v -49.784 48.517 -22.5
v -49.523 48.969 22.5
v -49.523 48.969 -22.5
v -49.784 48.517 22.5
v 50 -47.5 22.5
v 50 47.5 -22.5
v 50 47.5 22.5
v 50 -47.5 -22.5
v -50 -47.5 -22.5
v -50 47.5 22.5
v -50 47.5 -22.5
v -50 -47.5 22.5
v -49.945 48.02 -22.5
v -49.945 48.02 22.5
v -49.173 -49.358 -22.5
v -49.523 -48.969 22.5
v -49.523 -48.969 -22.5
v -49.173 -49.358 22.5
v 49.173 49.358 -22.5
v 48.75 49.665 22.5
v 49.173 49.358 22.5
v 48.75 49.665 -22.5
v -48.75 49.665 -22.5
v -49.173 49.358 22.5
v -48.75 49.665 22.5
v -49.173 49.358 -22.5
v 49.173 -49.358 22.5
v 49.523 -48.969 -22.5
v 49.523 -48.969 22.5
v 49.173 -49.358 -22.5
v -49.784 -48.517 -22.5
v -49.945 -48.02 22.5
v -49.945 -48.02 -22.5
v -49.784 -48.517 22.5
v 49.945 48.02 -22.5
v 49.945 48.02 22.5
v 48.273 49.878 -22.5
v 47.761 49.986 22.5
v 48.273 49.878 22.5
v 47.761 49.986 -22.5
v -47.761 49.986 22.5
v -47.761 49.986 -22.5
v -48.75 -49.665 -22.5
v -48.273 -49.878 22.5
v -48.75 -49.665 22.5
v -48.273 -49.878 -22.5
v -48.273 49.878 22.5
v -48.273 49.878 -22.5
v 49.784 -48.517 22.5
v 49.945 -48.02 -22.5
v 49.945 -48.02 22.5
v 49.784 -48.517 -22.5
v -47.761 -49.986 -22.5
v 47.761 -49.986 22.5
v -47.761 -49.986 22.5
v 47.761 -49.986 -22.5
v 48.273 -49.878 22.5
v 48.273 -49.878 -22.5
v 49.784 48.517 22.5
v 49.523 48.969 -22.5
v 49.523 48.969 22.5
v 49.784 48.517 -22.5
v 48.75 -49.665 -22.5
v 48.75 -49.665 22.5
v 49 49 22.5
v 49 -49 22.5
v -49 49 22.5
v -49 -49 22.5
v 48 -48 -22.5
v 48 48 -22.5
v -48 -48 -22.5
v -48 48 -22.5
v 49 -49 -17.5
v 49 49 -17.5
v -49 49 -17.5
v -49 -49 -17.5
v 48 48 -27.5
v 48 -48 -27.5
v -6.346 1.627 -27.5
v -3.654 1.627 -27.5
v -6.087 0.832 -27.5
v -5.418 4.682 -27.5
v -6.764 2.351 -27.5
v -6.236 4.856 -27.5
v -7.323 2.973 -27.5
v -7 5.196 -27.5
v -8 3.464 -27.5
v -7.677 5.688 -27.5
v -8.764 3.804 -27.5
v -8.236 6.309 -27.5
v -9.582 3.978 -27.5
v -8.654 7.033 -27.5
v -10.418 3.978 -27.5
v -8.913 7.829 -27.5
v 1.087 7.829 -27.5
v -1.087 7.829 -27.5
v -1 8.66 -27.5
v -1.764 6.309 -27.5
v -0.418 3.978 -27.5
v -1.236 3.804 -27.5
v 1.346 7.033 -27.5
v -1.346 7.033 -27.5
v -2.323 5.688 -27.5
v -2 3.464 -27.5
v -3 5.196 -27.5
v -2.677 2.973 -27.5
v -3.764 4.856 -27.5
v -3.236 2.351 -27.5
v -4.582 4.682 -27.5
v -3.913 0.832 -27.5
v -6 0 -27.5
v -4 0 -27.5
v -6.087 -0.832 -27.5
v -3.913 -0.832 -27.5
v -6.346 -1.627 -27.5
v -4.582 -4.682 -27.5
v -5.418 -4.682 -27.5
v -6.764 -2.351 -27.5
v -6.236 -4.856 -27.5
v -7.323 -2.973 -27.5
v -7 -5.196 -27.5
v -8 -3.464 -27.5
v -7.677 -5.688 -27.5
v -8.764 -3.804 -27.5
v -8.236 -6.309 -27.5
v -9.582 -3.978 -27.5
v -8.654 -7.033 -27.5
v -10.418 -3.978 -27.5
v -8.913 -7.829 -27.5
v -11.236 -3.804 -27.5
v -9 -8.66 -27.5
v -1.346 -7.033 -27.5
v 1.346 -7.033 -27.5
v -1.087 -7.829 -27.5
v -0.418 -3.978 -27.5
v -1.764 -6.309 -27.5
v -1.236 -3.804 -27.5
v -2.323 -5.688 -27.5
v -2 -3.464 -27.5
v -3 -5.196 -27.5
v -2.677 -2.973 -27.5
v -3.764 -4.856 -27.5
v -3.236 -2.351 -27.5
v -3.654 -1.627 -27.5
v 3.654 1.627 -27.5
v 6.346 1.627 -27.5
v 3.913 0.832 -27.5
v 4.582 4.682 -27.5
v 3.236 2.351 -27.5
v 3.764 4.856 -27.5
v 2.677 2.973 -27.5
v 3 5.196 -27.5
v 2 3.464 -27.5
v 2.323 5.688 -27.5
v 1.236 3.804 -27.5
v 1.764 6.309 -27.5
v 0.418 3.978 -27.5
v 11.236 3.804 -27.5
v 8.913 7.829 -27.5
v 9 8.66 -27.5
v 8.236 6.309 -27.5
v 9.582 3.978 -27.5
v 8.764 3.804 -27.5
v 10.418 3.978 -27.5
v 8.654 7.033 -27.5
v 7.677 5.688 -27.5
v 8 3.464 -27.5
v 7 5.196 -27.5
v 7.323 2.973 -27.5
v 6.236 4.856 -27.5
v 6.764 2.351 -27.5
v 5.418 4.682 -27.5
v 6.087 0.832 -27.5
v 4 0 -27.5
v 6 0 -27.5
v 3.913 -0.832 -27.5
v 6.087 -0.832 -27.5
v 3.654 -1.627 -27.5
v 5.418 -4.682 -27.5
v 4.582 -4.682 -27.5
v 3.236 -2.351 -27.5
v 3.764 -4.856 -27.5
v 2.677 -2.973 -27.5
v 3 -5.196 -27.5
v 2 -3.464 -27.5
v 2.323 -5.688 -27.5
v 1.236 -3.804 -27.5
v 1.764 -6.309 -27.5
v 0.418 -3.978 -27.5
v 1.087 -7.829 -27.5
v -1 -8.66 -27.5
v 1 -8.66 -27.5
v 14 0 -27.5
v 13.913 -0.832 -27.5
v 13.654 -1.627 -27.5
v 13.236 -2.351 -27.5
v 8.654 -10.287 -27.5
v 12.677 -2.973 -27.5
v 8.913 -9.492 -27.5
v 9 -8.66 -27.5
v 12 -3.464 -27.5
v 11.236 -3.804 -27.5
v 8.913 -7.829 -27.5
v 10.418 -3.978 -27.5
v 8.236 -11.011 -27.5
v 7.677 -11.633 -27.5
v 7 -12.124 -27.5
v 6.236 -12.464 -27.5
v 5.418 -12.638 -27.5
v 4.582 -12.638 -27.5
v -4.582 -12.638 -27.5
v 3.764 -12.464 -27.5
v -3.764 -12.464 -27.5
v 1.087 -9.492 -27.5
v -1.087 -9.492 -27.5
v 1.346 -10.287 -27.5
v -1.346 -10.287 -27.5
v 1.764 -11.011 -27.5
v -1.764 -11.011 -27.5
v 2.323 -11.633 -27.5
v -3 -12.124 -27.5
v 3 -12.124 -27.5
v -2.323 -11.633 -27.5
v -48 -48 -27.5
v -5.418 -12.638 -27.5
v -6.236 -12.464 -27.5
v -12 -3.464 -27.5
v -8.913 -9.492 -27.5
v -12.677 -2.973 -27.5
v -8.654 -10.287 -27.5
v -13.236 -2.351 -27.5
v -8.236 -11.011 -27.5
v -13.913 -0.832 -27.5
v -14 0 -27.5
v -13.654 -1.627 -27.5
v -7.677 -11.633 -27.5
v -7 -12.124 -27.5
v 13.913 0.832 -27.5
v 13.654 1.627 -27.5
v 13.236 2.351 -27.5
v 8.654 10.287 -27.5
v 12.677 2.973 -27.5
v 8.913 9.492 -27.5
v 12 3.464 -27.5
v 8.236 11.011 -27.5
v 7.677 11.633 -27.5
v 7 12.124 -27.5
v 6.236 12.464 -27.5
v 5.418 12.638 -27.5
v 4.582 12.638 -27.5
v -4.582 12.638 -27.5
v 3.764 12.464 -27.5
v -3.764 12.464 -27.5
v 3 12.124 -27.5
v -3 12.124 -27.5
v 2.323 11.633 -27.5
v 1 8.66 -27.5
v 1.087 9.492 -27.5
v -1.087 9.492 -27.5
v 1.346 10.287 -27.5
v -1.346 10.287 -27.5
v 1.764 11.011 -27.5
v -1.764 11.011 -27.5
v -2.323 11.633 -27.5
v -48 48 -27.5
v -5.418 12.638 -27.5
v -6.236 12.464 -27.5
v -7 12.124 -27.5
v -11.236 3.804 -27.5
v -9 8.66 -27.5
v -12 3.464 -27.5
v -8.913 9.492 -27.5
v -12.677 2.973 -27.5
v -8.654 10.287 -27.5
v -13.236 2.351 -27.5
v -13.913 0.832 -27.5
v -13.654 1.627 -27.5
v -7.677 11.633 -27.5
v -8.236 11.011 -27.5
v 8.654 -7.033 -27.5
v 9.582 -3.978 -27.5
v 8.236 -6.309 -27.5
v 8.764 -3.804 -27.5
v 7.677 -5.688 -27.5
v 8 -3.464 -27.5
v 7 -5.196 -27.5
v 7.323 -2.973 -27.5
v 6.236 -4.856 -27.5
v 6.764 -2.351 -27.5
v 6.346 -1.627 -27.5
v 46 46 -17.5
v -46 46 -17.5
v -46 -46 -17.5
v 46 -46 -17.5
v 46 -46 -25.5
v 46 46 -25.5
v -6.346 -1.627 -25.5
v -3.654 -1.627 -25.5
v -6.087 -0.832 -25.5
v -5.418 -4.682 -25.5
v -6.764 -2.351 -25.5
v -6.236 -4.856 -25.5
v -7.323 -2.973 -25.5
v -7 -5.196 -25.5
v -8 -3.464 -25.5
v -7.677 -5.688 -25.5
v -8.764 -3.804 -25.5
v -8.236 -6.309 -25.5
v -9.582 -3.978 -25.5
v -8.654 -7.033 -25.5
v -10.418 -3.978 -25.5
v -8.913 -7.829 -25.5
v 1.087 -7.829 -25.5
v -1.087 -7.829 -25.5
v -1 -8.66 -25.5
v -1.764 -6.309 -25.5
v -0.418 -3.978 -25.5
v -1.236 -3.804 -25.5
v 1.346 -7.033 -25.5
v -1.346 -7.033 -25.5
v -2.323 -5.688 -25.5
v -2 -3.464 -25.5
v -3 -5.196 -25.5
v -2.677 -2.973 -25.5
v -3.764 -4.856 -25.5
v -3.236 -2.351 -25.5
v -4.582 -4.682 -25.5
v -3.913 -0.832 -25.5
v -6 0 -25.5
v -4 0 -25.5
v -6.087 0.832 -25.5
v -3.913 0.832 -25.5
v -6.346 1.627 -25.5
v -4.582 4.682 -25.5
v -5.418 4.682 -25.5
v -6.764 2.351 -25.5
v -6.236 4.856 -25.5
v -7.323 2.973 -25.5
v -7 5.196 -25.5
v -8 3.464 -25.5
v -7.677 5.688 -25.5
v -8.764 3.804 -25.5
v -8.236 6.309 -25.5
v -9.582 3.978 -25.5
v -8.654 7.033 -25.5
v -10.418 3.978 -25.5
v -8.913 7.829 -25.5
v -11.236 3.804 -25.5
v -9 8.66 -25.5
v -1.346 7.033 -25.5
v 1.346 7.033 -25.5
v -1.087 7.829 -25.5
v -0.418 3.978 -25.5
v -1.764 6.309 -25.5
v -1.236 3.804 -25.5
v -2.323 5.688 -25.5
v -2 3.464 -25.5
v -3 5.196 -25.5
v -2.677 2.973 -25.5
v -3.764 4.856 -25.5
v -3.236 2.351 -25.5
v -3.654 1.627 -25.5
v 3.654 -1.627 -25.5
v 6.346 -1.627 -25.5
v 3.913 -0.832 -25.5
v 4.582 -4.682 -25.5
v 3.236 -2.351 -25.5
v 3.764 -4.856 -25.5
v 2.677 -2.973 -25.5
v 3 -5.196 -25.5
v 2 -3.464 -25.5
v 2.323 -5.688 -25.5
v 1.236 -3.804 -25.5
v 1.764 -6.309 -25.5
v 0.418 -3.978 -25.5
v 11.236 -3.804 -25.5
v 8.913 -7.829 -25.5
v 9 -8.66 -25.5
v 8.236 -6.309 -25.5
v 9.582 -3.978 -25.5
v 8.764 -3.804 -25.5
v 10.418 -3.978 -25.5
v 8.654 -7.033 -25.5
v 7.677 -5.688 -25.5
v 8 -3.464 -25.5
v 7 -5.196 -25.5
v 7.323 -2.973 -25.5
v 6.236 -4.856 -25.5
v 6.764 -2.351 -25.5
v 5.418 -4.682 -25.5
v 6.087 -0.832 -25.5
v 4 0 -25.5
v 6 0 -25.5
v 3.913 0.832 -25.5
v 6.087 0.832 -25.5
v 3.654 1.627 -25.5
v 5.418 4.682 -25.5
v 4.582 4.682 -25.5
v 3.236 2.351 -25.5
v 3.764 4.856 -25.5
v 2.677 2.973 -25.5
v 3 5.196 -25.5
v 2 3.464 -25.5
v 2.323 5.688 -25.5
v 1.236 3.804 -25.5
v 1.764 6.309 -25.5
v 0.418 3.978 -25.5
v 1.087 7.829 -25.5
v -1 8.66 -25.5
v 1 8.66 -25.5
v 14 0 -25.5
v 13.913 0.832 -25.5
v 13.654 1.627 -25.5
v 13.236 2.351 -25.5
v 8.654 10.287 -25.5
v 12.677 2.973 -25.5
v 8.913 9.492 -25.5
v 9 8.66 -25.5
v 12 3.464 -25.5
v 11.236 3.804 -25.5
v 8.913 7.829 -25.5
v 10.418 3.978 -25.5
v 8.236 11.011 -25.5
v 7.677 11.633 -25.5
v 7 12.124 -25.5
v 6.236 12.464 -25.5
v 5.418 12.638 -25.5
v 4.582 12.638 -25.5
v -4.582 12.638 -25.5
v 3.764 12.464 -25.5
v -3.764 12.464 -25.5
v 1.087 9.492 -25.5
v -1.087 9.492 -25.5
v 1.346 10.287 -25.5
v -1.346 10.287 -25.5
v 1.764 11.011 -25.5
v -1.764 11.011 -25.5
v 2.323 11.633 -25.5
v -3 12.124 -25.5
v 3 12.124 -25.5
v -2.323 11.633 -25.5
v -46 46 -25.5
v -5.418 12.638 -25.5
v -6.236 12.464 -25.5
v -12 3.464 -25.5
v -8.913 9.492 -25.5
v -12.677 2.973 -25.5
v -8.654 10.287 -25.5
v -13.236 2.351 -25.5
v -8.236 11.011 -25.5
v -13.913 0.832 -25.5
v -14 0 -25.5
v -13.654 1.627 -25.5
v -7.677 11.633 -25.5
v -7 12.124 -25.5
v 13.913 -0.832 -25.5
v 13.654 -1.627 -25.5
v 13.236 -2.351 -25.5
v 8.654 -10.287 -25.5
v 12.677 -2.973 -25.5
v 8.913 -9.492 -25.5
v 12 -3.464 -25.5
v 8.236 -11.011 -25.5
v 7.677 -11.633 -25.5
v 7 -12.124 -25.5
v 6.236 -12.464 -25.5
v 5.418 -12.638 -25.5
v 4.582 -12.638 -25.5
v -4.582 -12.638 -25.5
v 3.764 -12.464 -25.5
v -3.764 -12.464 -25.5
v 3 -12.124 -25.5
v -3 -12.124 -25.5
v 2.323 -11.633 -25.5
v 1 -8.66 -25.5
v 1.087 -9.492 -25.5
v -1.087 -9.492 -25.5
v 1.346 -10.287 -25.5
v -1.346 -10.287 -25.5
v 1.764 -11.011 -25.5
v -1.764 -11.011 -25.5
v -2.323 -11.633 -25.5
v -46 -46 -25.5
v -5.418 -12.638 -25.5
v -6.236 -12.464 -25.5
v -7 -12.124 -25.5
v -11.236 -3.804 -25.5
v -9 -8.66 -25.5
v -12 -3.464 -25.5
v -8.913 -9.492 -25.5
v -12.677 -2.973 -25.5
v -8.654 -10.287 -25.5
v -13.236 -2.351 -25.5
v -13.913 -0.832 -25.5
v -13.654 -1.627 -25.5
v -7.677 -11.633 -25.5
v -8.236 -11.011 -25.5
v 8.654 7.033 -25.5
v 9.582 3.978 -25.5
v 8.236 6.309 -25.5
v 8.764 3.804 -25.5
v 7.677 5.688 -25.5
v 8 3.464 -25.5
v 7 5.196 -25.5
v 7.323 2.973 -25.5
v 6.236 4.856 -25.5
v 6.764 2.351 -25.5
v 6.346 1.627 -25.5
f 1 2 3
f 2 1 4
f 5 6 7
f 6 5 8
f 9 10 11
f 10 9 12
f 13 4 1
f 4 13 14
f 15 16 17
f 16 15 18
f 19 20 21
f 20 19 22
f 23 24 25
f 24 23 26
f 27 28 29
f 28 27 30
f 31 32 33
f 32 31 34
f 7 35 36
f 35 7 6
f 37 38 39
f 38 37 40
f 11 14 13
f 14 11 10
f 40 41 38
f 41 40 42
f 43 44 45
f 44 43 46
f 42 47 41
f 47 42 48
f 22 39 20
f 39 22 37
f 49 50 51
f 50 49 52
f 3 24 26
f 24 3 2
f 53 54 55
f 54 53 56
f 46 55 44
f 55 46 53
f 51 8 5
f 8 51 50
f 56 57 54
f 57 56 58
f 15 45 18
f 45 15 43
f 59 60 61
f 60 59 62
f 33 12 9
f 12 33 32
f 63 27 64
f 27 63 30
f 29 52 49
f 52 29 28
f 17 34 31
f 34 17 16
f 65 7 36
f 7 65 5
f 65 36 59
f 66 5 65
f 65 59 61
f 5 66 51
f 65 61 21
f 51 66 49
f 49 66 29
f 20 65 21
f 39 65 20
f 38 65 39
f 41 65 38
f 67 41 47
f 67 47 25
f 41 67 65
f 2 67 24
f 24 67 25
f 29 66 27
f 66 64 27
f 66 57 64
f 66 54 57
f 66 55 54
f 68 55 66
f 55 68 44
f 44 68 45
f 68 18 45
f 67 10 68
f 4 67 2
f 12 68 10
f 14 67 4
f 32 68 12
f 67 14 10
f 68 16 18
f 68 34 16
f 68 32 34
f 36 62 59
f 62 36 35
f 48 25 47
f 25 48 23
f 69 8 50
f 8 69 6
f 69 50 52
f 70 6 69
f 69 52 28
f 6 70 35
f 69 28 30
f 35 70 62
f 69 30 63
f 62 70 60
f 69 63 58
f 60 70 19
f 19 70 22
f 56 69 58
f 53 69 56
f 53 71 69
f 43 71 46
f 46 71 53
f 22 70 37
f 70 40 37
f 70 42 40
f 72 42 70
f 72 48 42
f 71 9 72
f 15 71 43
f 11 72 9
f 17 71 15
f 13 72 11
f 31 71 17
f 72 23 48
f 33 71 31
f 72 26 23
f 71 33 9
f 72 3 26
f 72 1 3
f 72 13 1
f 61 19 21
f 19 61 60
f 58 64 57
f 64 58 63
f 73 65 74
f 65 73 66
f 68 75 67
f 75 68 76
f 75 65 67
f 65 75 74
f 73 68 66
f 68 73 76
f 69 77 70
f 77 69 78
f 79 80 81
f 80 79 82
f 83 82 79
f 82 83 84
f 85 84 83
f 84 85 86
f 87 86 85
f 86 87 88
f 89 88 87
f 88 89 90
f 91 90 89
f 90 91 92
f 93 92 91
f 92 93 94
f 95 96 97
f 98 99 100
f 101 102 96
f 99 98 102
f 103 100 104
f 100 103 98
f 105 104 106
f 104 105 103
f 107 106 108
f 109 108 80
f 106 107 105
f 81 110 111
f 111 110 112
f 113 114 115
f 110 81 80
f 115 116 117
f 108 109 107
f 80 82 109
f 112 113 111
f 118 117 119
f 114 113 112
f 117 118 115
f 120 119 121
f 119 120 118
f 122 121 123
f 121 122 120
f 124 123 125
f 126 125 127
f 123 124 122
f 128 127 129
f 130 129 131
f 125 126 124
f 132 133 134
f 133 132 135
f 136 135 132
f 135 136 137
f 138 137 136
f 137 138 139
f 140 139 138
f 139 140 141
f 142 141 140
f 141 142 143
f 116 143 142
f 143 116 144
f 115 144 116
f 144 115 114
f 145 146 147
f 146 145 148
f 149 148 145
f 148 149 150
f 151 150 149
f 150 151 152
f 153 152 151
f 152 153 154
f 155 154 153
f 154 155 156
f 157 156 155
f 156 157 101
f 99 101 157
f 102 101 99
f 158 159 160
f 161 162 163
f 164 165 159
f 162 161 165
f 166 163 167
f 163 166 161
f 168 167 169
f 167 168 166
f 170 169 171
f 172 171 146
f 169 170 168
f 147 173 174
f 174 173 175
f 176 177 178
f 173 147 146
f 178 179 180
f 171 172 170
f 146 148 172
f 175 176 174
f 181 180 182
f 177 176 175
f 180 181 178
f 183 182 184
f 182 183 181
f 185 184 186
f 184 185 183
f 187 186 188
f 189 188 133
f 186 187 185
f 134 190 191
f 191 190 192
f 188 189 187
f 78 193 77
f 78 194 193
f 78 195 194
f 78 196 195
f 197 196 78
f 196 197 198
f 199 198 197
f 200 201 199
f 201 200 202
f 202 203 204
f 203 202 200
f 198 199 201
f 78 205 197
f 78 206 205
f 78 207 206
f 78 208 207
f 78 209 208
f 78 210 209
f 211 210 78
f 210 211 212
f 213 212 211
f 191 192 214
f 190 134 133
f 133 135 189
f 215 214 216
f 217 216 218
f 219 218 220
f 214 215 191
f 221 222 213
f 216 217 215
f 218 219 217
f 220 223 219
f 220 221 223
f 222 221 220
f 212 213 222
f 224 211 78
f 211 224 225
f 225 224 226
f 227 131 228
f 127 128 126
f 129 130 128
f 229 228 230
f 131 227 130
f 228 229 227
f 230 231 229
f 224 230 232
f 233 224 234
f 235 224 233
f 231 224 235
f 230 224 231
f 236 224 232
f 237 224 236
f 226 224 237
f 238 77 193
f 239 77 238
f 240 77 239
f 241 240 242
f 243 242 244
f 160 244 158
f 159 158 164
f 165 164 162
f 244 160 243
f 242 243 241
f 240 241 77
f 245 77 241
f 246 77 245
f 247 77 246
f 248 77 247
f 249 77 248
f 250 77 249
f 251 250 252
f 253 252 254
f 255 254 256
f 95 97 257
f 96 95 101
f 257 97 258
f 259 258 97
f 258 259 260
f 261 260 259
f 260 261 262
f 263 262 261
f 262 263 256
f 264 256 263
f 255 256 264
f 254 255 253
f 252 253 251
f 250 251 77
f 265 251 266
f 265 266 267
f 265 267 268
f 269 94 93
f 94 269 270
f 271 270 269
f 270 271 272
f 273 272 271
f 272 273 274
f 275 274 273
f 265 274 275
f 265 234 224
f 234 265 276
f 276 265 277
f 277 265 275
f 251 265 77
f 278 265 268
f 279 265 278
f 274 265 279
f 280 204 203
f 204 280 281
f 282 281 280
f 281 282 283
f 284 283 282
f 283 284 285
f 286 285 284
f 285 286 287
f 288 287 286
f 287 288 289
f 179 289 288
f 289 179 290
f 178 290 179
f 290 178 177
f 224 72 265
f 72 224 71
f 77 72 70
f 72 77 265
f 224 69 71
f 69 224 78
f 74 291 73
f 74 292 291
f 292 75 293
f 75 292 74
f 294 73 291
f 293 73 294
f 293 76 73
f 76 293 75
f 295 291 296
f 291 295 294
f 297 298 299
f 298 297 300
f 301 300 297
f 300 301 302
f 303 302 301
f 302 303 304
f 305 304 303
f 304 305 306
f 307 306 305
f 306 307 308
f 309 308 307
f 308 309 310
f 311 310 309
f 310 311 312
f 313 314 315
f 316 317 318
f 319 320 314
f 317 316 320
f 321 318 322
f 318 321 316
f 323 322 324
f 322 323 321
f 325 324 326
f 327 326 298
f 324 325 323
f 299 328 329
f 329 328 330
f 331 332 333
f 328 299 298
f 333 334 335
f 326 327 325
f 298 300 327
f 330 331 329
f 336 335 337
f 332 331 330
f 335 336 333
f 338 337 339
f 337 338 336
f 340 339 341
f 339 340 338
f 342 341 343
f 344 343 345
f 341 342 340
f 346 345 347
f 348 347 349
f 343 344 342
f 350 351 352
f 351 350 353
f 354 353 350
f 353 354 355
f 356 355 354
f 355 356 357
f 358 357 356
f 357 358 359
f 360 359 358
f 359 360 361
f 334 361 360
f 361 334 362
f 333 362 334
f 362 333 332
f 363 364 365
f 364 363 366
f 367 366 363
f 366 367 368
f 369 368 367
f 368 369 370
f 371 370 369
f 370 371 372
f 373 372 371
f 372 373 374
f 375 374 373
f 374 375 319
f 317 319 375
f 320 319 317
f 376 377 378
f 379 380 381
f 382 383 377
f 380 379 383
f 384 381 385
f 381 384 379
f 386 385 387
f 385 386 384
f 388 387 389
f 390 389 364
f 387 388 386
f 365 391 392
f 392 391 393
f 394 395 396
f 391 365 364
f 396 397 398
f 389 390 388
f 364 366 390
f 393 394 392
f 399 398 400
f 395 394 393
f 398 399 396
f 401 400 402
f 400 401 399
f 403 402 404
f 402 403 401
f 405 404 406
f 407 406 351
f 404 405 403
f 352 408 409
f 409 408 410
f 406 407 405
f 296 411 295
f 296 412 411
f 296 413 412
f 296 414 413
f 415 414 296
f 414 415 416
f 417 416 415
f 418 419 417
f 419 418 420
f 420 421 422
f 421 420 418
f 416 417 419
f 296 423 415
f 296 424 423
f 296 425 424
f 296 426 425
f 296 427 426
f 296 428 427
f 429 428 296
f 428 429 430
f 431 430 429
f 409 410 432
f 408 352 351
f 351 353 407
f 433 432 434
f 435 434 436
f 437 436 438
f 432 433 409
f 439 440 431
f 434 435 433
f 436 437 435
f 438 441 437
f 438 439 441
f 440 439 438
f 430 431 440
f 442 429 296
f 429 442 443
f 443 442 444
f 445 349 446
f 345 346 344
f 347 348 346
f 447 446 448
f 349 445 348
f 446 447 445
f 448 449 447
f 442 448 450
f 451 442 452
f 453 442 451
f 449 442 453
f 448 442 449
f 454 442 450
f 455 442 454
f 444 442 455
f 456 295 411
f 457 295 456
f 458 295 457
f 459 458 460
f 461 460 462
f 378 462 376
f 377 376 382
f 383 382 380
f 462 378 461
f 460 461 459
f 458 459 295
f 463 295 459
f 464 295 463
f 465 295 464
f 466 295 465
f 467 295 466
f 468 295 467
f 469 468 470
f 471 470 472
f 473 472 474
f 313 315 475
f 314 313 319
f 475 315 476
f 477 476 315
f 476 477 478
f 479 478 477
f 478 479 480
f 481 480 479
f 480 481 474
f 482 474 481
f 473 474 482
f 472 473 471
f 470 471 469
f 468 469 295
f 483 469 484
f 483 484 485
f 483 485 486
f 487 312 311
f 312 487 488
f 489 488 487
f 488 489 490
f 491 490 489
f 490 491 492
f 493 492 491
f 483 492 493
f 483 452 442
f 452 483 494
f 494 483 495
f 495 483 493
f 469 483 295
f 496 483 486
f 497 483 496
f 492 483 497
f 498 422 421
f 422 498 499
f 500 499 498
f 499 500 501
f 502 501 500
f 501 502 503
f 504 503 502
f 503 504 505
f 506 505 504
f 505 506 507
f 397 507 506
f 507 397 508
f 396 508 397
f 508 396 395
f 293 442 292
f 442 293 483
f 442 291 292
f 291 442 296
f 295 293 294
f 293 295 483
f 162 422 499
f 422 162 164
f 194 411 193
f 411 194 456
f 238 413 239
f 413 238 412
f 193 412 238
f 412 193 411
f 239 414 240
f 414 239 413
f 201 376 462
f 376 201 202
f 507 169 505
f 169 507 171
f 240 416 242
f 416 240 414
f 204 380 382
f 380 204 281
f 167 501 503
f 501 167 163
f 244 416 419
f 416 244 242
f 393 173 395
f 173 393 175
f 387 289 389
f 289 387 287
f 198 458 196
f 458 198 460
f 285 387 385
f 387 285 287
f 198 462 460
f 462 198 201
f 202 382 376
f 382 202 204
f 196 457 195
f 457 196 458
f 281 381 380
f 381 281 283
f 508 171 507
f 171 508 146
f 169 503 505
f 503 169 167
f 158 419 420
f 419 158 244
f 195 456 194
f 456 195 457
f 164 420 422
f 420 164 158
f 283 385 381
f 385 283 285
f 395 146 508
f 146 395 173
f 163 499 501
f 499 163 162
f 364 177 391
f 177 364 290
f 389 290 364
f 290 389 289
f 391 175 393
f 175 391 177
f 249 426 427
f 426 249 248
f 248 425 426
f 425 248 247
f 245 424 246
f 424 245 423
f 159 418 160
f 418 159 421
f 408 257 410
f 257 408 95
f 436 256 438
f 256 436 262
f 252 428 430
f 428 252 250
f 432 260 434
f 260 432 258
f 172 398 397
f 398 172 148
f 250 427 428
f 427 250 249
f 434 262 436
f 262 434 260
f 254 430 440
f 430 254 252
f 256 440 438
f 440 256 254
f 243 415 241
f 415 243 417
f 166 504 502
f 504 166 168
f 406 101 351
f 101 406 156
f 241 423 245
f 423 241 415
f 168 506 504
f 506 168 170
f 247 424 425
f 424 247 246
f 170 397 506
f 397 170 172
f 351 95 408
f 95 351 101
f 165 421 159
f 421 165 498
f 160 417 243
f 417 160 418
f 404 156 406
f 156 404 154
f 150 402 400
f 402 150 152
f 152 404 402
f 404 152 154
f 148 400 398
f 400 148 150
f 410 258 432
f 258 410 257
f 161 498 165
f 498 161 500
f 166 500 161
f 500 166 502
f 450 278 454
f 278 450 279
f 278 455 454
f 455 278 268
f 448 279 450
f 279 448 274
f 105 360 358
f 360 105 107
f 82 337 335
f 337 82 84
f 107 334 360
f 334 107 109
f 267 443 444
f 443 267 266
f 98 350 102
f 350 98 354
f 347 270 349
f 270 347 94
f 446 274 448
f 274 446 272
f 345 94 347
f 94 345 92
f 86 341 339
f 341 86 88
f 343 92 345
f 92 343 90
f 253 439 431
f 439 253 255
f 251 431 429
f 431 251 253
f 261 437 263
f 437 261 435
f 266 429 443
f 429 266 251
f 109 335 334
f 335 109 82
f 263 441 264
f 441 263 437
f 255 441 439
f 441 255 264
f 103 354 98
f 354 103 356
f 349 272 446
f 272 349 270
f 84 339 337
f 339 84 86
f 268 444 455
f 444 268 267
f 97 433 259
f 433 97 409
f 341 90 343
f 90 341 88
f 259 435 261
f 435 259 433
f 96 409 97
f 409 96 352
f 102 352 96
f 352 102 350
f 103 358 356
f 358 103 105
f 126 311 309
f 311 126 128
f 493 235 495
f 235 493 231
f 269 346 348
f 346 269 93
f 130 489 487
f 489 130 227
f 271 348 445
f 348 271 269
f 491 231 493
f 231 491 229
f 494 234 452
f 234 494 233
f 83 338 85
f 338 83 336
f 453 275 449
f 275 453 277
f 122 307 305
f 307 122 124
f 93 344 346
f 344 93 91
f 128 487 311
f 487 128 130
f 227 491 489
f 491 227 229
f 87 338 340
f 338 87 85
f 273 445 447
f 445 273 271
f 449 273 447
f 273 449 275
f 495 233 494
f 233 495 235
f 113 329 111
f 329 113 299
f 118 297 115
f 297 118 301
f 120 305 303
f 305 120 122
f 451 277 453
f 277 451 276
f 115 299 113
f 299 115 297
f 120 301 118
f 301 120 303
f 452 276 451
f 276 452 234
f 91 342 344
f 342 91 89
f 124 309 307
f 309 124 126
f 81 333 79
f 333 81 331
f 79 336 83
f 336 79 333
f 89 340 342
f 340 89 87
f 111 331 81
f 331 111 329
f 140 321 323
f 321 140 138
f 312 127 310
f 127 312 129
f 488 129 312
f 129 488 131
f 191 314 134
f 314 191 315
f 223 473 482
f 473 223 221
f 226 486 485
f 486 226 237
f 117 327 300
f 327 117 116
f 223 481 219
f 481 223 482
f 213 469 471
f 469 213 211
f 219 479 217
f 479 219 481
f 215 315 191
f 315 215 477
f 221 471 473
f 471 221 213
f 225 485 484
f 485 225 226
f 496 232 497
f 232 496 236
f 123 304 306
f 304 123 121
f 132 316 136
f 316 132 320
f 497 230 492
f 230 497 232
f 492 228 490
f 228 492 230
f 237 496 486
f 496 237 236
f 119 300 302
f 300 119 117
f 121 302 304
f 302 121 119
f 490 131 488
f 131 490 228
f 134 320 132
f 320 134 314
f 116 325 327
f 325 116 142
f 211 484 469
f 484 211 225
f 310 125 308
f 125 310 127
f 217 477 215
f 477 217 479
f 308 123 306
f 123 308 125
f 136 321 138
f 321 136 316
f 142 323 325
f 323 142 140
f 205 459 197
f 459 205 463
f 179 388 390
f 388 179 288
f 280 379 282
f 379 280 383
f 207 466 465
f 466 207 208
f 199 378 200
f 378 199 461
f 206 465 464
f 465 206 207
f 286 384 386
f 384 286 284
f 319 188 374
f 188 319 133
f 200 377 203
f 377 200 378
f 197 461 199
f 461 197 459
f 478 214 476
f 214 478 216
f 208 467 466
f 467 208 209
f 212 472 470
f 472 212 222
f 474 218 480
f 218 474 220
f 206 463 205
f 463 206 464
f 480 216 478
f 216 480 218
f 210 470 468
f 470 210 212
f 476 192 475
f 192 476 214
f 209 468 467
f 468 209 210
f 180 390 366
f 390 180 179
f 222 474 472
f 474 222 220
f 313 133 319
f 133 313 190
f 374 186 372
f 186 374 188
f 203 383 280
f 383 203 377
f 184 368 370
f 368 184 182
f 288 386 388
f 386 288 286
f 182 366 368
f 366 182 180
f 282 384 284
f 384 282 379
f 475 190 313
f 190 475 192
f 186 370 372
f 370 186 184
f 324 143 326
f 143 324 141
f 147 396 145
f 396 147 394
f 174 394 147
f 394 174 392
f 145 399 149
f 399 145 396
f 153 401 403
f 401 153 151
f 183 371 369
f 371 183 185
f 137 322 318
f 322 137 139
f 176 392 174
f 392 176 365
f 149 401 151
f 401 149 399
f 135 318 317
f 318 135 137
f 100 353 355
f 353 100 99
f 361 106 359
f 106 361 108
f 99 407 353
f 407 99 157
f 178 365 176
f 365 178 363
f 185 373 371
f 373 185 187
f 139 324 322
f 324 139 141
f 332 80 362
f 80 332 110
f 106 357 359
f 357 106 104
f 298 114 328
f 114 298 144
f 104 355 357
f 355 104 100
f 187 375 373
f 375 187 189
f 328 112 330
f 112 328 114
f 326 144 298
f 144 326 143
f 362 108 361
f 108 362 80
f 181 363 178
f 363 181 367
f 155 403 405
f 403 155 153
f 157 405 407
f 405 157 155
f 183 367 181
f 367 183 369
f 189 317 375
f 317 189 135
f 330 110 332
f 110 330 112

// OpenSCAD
// file: parameters.scad
$width = 100;
$depth = 100;
$height = 50;

$margin = 2;

$connection = 5;

$hole_dia = 4;
// file: ../util/rounded_cube.scad
// Copyright & Credit (C): https://gist.github.com/groovenectar/92174cb1c98c1089347e
// More information: https://danielupshaw.com/openscad-rounded-corners/

// Set to 0.01 for higher definition curves (renders slower)
$fs = 0.15;

module roundedcube(size = [1, 1, 1], center = false, radius = 0.5, apply_to = "all") {
	// If single value, convert to [x, y, z] vector
	size = (size[0] == undef) ? [size, size, size] : size;

	translate_min = radius;
	translate_xmax = size[0] - radius;
	translate_ymax = size[1] - radius;
	translate_zmax = size[2] - radius;

	diameter = radius * 2;

	obj_translate = (center == false) ?
		[0, 0, 0] : [
			-(size[0] / 2),
			-(size[1] / 2),
			-(size[2] / 2)
		];

	translate(v = obj_translate) {
		hull() {
			for (translate_x = [translate_min, translate_xmax]) {
				x_at = (translate_x == translate_min) ? "min" : "max";
				for (translate_y = [translate_min, translate_ymax]) {
					y_at = (translate_y == translate_min) ? "min" : "max";
					for (translate_z = [translate_min, translate_zmax]) {
						z_at = (translate_z == translate_min) ? "min" : "max";

						translate(v = [translate_x, translate_y, translate_z])
						if (
							(apply_to == "all") ||
							(apply_to == "xmin" && x_at == "min") || (apply_to == "xmax" && x_at == "max") ||
							(apply_to == "ymin" && y_at == "min") || (apply_to == "ymax" && y_at == "max") ||
							(apply_to == "zmin" && z_at == "min") || (apply_to == "zmax" && z_at == "max")
						) {
							sphere(r = radius);
						} else {
							rotate = 
								(apply_to == "xmin" || apply_to == "xmax" || apply_to == "x") ? [0, 90, 0] : (
								(apply_to == "ymin" || apply_to == "ymax" || apply_to == "y") ? [90, 90, 0] :
								[0, 0, 0]
							);
							rotate(a = rotate)
							cylinder(h = diameter, r = radius, center = true);
						}
					}
				}
			}
		}
	}
}
// main file
include <../util/rounded_cube.scad>
include <parameters.scad>

module planter() {
  union() {
    difference() {
      difference() {
        union() {
          // Top part of planter
          color("lime") difference() {
            roundedcube(size = [ $width, $depth, $height - $connection ],
                        center = true, radius = 2.5, apply_to = "z");

            // DIFF
            translate([ 0, 0, $margin ]) cube(
                size =
                    [ $width - $margin, $depth - $margin, $height + $margin ],
                center = true);
          }

          // Bottom connector
          color("tomato") translate([ 0, 0, -($height / 2) ]) {
            union() {
              // Connector part
              cube(size =
                       [
                         $width - $margin * 2, $depth - $margin * 2,
                         $connection
                       ],
                   center = true);

              // Connecting bit to outer shell
              translate([ 0, 0, $connection ])
                  roundedcube(size = [ $width, $depth, $connection ], center = true, radius = 2.5, apply_to = "z");
            }
          }
        }
        // DIFF
        translate([ 0, 0, -$height / 2 + $margin * 2 ])
            cube(size =
                     [
                       $width - $margin * 4, $depth - $margin * 4,
                       $connection + $margin * 2
                     ],
                 center = true);
      }

      // Drainage holes
      translate([ 0, 0, -$height ]) cylinder($height, $hole_dia, $hole_dia);
      for (i = [0:5]) {
        rotate([ 0, 0, 360 / 6 * i ])
            translate([ $hole_dia * 2 + $margin, 0, -$height ])
                cylinder($height, $hole_dia, $hole_dia);
      }
    }

    // color("violet") translate([ 0, 0, -$height / 2 - $margin * 1.25 ]) {
    //   difference() {
    //     cylinder($height, $hole_dia, $hole_dia);
    //     translate([ 0, 0, -$margin ])
    //         cylinder($height + $margin * 2, $hole_dia - $margin * 0.5,
    //                  $hole_dia - $margin * 0.5);
    //   }
    // }
  }
}
planter();
